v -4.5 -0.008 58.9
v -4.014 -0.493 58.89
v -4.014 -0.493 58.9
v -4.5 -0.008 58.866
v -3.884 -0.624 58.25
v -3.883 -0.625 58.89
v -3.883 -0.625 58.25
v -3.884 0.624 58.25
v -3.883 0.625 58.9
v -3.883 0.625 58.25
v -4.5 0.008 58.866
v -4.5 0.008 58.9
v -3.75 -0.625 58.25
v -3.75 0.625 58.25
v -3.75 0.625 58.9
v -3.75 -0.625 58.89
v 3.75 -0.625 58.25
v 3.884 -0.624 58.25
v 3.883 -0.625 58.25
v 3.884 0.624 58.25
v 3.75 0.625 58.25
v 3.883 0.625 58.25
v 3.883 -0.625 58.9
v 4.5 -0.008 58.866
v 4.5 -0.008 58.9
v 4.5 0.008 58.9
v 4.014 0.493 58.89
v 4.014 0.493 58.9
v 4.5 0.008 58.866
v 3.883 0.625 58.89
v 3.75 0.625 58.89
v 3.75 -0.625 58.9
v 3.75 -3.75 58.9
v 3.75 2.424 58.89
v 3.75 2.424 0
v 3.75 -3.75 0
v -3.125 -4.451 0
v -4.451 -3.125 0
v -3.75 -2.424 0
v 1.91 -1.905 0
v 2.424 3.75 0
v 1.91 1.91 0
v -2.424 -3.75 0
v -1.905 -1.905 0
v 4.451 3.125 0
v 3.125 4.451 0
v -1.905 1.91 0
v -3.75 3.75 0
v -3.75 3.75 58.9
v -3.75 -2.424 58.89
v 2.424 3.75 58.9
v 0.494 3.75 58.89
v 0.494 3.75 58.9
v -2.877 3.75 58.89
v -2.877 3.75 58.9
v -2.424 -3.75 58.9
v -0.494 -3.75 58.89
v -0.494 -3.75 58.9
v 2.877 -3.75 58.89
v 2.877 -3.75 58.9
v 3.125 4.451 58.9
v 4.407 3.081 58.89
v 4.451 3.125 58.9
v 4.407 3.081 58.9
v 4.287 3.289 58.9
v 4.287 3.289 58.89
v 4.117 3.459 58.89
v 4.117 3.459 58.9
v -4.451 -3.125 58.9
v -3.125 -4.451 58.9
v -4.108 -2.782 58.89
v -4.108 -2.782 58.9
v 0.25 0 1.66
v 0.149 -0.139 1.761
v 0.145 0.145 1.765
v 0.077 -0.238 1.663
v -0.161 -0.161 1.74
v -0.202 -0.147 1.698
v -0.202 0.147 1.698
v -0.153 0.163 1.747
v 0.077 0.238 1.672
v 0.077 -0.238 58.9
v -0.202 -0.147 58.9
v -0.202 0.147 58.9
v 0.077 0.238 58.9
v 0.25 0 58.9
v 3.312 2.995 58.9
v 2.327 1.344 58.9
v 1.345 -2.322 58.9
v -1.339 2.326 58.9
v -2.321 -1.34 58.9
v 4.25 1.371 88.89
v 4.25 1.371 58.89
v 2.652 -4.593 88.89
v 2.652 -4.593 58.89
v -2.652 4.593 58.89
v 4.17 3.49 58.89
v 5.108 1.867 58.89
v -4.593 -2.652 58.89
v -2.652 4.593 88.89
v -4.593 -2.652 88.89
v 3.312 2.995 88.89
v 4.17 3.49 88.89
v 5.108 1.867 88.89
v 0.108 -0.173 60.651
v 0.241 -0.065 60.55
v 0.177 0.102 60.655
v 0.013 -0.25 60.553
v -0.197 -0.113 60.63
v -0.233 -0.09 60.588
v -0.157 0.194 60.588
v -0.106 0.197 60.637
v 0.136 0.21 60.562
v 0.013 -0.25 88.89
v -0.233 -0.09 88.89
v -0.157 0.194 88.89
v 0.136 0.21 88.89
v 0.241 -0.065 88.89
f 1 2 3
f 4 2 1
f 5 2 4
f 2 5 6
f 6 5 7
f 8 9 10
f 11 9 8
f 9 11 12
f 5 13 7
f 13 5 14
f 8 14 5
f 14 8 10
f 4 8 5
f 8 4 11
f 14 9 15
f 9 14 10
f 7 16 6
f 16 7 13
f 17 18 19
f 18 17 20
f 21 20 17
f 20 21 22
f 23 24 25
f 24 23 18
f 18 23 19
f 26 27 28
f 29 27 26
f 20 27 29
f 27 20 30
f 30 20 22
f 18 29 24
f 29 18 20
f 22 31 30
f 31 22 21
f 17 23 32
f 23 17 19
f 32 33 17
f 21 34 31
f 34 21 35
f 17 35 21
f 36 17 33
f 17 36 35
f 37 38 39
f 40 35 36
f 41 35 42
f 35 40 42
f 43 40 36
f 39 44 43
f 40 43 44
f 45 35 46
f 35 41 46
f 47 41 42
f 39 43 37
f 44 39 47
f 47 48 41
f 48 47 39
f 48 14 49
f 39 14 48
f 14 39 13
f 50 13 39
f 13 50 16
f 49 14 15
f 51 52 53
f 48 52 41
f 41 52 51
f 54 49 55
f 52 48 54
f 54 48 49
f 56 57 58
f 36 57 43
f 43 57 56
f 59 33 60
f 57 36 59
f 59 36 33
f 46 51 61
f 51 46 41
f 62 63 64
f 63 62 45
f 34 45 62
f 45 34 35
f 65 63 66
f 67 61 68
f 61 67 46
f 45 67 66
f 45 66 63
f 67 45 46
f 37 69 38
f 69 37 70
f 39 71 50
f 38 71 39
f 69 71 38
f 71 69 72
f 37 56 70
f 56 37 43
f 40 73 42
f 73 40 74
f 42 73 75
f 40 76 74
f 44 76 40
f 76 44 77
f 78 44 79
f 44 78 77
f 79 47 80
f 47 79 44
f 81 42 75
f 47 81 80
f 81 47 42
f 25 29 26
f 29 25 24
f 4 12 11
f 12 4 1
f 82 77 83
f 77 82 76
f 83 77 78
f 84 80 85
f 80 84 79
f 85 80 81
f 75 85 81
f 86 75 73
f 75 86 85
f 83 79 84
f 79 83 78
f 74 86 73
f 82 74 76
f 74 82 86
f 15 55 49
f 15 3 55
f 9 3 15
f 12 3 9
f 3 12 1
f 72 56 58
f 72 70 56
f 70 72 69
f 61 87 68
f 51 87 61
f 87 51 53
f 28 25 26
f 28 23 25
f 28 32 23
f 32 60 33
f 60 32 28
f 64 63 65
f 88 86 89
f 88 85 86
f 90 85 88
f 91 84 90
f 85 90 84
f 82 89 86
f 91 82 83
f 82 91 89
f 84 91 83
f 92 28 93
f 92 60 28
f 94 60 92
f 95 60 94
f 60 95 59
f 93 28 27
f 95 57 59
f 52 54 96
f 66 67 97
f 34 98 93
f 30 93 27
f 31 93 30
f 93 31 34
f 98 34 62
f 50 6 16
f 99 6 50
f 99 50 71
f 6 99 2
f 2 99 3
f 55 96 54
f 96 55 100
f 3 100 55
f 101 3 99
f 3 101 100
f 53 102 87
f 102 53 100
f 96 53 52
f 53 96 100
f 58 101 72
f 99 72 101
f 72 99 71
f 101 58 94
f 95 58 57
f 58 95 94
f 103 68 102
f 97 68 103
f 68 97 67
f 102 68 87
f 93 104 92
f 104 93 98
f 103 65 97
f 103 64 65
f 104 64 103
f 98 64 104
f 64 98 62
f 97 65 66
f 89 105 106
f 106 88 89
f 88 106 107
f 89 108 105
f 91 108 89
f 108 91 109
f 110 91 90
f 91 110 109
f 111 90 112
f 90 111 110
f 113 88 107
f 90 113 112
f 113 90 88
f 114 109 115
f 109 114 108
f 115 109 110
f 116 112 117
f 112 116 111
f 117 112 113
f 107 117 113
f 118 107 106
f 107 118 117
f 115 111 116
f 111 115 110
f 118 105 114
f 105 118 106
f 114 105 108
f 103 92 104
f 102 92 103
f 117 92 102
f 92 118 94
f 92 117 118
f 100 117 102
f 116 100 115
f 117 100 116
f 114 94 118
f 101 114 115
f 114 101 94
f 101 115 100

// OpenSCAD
use <../bed_carriage.scad>

// ye olde stuff
//
//module qnd() {
//    difference() {
//        corner_arm();
//        cube([95,95,15]);
//        translate([0,0,5]) cube([140,140,15]);
//        cube([140,140,1]);
//    }
//}
//
//rotate([180,0,0]) qnd();

module rail_center_quickfix_joiner() {
    difference() {
        bed_rail_center();
        cylinder(d=20,h=58.9);
    }
    rotate([0,0,45]) intersection() {
        bed_rail_center();
        translate([1,1,59/2]) cube([9.5,9.5,59],center=true);
    }
}

module rail_center_quickfix_joiner2() {
    difference() {
        bed_rail_center();
        translate([0,0,58.9]) cylinder(d=20,h=68.9);
    }
    translate([0,0,58.89]) rotate([0,0,-15]) intersection() {
        bed_rail_center();
        translate([1,1,30/2]) cube([9.5,9.5,30],center=true);
    }
}

//rail_center_quickfix_joiner();
rail_center_quickfix_joiner2();
